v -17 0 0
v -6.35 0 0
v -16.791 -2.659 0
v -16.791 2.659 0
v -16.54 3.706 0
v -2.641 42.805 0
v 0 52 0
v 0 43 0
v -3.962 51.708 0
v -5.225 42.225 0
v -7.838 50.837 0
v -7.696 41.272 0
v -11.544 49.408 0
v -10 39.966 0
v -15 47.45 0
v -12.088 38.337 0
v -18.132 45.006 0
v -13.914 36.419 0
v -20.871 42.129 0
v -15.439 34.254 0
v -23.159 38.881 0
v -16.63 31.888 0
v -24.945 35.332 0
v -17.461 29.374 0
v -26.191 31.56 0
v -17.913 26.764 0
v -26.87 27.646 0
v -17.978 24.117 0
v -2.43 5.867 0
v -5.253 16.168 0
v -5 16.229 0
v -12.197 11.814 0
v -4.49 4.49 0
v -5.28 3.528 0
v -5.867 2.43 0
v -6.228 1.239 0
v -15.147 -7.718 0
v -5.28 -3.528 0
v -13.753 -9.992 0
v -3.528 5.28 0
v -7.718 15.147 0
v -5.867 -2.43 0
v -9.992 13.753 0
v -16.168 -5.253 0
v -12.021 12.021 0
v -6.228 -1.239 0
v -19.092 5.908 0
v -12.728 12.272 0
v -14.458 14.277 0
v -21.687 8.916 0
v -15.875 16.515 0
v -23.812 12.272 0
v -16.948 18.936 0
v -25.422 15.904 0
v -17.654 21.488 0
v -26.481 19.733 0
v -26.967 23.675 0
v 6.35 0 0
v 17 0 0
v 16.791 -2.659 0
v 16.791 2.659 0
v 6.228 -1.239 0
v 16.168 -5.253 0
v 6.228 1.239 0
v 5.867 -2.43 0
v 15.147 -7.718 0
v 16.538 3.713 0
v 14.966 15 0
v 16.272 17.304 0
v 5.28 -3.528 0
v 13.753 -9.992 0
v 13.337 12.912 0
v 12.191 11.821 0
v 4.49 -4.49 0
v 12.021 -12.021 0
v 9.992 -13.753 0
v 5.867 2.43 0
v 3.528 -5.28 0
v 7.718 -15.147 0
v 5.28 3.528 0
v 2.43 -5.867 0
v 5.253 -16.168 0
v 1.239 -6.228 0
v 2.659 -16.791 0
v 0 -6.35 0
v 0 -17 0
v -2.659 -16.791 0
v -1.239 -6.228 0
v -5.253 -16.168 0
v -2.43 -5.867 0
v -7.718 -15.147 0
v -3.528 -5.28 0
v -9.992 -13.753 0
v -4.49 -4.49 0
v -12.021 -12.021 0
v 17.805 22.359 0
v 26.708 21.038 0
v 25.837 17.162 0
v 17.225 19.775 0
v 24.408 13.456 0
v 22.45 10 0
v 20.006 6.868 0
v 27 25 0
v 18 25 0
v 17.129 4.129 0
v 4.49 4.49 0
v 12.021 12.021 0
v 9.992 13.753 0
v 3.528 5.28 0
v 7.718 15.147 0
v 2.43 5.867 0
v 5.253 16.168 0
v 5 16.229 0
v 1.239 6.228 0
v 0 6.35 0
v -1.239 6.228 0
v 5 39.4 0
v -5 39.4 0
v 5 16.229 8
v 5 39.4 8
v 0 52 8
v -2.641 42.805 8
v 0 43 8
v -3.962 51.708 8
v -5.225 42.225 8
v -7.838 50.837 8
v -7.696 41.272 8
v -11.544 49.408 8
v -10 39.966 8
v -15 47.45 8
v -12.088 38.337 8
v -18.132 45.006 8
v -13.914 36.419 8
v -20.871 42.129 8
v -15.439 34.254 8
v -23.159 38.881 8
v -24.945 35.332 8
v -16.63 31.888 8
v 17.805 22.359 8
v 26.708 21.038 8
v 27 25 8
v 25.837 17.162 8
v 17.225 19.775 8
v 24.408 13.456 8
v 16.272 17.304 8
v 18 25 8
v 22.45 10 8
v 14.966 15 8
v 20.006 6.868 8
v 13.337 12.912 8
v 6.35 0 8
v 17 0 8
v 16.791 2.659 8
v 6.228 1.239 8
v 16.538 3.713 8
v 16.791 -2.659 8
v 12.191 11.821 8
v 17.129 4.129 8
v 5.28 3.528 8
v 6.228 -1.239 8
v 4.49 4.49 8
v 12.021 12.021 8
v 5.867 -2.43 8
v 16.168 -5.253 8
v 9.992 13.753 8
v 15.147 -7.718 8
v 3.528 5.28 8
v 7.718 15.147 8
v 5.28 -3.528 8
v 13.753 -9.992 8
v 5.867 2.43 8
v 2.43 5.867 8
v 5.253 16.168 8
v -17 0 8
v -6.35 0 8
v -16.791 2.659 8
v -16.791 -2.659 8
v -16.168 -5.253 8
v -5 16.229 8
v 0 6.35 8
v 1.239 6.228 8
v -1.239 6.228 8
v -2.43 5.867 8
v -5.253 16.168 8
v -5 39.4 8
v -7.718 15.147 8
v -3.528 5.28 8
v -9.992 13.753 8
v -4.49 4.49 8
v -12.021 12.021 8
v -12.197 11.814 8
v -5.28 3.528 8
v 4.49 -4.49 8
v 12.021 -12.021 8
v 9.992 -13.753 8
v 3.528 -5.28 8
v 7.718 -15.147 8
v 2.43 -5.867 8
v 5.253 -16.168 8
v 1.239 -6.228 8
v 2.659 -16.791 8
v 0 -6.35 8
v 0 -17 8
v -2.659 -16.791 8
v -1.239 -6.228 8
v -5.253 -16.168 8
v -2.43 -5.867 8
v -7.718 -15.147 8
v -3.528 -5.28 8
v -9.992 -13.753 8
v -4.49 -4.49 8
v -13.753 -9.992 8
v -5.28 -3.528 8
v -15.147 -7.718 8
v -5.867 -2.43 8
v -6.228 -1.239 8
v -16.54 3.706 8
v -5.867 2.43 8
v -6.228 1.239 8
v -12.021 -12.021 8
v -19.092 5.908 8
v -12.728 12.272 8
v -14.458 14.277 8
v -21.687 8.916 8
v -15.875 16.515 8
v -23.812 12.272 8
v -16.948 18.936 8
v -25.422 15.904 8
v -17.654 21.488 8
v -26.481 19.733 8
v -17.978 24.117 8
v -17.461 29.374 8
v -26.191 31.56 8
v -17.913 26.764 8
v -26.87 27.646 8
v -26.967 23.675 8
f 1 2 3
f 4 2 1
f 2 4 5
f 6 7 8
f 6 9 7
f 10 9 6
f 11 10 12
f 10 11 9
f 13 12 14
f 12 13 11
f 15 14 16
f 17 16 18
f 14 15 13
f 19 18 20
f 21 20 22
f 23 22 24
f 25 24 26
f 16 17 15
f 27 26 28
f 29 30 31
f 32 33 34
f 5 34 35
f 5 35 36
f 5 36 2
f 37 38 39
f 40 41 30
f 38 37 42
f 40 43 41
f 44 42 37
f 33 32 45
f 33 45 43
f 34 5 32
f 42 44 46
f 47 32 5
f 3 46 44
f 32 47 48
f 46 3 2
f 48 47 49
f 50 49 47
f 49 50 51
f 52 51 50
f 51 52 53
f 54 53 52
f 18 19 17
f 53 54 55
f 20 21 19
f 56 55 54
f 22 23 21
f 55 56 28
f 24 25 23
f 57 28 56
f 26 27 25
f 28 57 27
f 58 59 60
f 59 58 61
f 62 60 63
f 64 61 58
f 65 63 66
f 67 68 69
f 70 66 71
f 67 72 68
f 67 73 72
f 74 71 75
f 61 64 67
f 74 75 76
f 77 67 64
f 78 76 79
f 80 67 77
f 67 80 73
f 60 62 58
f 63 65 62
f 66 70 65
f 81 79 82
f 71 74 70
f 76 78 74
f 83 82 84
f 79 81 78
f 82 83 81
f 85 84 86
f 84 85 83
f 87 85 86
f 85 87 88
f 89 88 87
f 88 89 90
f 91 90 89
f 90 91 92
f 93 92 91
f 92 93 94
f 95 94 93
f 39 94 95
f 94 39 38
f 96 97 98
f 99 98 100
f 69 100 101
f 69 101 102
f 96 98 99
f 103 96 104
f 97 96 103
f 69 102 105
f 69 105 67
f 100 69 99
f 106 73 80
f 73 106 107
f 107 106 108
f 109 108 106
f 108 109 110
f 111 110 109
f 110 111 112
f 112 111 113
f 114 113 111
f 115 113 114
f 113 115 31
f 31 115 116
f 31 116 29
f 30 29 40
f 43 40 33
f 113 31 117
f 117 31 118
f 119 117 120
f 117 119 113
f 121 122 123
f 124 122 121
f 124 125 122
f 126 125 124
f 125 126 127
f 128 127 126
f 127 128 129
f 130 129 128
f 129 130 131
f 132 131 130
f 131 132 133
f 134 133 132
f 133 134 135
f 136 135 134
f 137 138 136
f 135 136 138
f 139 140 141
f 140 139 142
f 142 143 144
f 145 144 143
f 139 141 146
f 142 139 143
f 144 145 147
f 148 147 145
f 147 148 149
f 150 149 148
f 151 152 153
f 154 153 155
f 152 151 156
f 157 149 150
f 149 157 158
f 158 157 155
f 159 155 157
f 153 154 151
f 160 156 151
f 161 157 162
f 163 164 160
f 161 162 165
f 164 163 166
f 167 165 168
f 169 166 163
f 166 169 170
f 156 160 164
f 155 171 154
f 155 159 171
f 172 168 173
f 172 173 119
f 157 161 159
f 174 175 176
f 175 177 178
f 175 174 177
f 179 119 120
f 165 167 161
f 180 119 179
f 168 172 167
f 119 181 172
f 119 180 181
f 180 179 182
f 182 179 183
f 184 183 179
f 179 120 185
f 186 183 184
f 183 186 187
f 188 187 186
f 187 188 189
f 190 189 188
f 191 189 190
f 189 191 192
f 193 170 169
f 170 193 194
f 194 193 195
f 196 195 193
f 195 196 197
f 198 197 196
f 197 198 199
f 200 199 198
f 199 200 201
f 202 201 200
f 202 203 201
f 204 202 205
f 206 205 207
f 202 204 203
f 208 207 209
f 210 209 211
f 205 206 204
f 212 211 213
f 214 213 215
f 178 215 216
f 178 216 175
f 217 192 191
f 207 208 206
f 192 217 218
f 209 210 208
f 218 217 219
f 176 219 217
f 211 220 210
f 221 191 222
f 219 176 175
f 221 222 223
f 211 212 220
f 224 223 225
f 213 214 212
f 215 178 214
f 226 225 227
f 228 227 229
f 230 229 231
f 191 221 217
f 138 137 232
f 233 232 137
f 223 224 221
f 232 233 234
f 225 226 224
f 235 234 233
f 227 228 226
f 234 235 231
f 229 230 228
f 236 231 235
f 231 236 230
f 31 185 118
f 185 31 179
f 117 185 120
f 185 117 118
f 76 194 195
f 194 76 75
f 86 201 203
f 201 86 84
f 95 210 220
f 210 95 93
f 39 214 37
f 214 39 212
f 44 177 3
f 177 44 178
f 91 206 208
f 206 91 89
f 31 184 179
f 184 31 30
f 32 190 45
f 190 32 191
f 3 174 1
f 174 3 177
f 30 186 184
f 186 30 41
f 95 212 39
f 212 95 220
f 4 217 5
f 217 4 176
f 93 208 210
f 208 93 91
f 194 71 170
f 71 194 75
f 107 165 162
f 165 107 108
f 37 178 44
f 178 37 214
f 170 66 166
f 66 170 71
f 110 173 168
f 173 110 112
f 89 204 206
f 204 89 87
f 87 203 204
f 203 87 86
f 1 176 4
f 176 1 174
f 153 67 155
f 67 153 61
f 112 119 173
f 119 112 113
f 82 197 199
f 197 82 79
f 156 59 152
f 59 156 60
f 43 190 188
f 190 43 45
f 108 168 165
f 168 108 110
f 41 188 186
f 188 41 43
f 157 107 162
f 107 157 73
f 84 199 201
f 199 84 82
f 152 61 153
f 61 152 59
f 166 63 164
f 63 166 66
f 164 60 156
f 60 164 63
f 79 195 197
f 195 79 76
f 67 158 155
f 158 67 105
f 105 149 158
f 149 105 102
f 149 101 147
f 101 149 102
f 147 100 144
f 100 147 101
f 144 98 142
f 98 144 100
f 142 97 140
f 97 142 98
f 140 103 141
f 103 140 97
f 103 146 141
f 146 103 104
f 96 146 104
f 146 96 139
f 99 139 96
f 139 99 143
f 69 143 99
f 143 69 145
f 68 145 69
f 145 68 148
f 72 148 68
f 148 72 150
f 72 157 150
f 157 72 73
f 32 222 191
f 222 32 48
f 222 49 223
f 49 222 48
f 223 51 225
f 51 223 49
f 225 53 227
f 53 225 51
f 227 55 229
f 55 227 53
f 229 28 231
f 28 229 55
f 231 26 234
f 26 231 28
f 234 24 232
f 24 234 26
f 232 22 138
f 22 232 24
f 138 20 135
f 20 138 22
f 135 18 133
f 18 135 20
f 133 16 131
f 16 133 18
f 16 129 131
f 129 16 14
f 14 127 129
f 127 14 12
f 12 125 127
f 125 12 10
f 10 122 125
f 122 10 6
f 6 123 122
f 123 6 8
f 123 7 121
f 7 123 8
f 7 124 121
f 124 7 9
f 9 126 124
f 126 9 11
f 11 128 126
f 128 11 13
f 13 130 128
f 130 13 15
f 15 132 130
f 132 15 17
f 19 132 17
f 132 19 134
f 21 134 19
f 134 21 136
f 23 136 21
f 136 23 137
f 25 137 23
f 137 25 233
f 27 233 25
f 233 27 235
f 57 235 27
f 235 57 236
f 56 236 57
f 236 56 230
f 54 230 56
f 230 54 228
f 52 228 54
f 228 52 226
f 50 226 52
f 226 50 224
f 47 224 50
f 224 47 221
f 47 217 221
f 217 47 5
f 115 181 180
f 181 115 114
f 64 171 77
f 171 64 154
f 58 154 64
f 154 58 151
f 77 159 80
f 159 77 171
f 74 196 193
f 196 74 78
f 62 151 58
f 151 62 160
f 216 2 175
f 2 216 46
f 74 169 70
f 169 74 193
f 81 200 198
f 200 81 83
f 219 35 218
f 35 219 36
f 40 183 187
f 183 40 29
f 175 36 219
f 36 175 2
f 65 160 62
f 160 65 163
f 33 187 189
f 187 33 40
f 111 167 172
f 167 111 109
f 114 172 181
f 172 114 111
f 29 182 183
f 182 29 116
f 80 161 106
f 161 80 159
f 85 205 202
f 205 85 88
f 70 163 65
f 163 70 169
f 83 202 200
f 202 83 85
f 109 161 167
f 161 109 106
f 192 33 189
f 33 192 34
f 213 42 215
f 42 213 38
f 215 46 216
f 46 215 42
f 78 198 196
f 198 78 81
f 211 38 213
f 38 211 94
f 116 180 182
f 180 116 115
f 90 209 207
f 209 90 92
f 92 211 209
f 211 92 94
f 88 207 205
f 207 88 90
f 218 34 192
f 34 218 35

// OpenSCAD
$fn = 32;

// ----------------------------------------------------------------------
// Hook: 50 mm shank into a 18 mm curl, 8 mm thick
// ----------------------------------------------------------------------

// --- parameters (mm) ---
shank_len = 50;           // shank length from the boss centre
shank_w = 10;             // shank width
boss_d = 34;              // boss diameter
bore_d = 12.7;            // boss bore
curl_in = 18;             // curl inner radius
curl_out = 27;            // curl outer radius
curl_sweep = 270;         // curl sweep angle
hook_t = 8;               // hook thickness

shank_profile = [[-5, 39.4], [5, 39.4], [5, 15], [-5, 15]];
boss_profile = [[17, 0], [16.791, 2.659], [16.168, 5.253], [15.147, 7.718], [13.753, 9.992], [12.021, 12.021], [9.992, 13.753], [7.718, 15.147], [5.253, 16.168], [2.659, 16.791], [0, 17], [-2.659, 16.791], [-5.253, 16.168], [-7.718, 15.147], [-9.992, 13.753], [-12.021, 12.021], [-13.753, 9.992], [-15.147, 7.718], [-16.168, 5.253], [-16.791, 2.659], [-17, 0], [-16.791, -2.659], [-16.168, -5.253], [-15.147, -7.718], [-13.753, -9.992], [-12.021, -12.021], [-9.992, -13.753], [-7.718, -15.147], [-5.253, -16.168], [-2.659, -16.791], [0, -17], [2.659, -16.791], [5.253, -16.168], [7.718, -15.147], [9.992, -13.753], [12.021, -12.021], [13.753, -9.992], [15.147, -7.718], [16.168, -5.253], [16.791, -2.659]];
curl_profile = [[0, 52], [-3.962, 51.708], [-7.838, 50.837], [-11.544, 49.408], [-15, 47.45], [-18.132, 45.006], [-20.871, 42.129], [-23.159, 38.881], [-24.945, 35.332], [-26.191, 31.56], [-26.87, 27.646], [-26.967, 23.675], [-26.481, 19.733], [-25.422, 15.904], [-23.812, 12.272], [-21.687, 8.916], [-19.092, 5.908], [-16.084, 3.313], [-12.728, 1.188], [-9.096, -0.422], [-5.267, -1.481], [-1.325, -1.967], [2.646, -1.87], [6.56, -1.191], [10.332, 0.055], [13.881, 1.841], [17.129, 4.129], [20.006, 6.868], [22.45, 10], [24.408, 13.456], [25.837, 17.162], [26.708, 21.038], [27, 25], [18, 25], [17.805, 22.359], [17.225, 19.775], [16.272, 17.304], [14.966, 15], [13.337, 12.912], [11.419, 11.086], [9.254, 9.561], [6.888, 8.37], [4.374, 7.539], [1.764, 7.087], [-0.883, 7.022], [-3.512, 7.346], [-6.064, 8.052], [-8.485, 9.125], [-10.723, 10.542], [-12.728, 12.272], [-14.458, 14.277], [-15.875, 16.515], [-16.948, 18.936], [-17.654, 21.488], [-17.978, 24.117], [-17.913, 26.764], [-17.461, 29.374], [-16.63, 31.888], [-15.439, 34.254], [-13.914, 36.419], [-12.088, 38.337], [-10, 39.966], [-7.696, 41.272], [-5.225, 42.225], [-2.641, 42.805], [0, 43]];

difference() {
  union() {
    /* three overlapping outlines: shank, boss and the smooth curl */
    linear_extrude(height = hook_t) polygon(shank_profile);
    linear_extrude(height = hook_t) polygon(boss_profile);
    linear_extrude(height = hook_t) polygon(curl_profile);
  }
  translate([0, 0, -2.5]) cylinder(h = hook_t + 5, d = bore_d);
}
